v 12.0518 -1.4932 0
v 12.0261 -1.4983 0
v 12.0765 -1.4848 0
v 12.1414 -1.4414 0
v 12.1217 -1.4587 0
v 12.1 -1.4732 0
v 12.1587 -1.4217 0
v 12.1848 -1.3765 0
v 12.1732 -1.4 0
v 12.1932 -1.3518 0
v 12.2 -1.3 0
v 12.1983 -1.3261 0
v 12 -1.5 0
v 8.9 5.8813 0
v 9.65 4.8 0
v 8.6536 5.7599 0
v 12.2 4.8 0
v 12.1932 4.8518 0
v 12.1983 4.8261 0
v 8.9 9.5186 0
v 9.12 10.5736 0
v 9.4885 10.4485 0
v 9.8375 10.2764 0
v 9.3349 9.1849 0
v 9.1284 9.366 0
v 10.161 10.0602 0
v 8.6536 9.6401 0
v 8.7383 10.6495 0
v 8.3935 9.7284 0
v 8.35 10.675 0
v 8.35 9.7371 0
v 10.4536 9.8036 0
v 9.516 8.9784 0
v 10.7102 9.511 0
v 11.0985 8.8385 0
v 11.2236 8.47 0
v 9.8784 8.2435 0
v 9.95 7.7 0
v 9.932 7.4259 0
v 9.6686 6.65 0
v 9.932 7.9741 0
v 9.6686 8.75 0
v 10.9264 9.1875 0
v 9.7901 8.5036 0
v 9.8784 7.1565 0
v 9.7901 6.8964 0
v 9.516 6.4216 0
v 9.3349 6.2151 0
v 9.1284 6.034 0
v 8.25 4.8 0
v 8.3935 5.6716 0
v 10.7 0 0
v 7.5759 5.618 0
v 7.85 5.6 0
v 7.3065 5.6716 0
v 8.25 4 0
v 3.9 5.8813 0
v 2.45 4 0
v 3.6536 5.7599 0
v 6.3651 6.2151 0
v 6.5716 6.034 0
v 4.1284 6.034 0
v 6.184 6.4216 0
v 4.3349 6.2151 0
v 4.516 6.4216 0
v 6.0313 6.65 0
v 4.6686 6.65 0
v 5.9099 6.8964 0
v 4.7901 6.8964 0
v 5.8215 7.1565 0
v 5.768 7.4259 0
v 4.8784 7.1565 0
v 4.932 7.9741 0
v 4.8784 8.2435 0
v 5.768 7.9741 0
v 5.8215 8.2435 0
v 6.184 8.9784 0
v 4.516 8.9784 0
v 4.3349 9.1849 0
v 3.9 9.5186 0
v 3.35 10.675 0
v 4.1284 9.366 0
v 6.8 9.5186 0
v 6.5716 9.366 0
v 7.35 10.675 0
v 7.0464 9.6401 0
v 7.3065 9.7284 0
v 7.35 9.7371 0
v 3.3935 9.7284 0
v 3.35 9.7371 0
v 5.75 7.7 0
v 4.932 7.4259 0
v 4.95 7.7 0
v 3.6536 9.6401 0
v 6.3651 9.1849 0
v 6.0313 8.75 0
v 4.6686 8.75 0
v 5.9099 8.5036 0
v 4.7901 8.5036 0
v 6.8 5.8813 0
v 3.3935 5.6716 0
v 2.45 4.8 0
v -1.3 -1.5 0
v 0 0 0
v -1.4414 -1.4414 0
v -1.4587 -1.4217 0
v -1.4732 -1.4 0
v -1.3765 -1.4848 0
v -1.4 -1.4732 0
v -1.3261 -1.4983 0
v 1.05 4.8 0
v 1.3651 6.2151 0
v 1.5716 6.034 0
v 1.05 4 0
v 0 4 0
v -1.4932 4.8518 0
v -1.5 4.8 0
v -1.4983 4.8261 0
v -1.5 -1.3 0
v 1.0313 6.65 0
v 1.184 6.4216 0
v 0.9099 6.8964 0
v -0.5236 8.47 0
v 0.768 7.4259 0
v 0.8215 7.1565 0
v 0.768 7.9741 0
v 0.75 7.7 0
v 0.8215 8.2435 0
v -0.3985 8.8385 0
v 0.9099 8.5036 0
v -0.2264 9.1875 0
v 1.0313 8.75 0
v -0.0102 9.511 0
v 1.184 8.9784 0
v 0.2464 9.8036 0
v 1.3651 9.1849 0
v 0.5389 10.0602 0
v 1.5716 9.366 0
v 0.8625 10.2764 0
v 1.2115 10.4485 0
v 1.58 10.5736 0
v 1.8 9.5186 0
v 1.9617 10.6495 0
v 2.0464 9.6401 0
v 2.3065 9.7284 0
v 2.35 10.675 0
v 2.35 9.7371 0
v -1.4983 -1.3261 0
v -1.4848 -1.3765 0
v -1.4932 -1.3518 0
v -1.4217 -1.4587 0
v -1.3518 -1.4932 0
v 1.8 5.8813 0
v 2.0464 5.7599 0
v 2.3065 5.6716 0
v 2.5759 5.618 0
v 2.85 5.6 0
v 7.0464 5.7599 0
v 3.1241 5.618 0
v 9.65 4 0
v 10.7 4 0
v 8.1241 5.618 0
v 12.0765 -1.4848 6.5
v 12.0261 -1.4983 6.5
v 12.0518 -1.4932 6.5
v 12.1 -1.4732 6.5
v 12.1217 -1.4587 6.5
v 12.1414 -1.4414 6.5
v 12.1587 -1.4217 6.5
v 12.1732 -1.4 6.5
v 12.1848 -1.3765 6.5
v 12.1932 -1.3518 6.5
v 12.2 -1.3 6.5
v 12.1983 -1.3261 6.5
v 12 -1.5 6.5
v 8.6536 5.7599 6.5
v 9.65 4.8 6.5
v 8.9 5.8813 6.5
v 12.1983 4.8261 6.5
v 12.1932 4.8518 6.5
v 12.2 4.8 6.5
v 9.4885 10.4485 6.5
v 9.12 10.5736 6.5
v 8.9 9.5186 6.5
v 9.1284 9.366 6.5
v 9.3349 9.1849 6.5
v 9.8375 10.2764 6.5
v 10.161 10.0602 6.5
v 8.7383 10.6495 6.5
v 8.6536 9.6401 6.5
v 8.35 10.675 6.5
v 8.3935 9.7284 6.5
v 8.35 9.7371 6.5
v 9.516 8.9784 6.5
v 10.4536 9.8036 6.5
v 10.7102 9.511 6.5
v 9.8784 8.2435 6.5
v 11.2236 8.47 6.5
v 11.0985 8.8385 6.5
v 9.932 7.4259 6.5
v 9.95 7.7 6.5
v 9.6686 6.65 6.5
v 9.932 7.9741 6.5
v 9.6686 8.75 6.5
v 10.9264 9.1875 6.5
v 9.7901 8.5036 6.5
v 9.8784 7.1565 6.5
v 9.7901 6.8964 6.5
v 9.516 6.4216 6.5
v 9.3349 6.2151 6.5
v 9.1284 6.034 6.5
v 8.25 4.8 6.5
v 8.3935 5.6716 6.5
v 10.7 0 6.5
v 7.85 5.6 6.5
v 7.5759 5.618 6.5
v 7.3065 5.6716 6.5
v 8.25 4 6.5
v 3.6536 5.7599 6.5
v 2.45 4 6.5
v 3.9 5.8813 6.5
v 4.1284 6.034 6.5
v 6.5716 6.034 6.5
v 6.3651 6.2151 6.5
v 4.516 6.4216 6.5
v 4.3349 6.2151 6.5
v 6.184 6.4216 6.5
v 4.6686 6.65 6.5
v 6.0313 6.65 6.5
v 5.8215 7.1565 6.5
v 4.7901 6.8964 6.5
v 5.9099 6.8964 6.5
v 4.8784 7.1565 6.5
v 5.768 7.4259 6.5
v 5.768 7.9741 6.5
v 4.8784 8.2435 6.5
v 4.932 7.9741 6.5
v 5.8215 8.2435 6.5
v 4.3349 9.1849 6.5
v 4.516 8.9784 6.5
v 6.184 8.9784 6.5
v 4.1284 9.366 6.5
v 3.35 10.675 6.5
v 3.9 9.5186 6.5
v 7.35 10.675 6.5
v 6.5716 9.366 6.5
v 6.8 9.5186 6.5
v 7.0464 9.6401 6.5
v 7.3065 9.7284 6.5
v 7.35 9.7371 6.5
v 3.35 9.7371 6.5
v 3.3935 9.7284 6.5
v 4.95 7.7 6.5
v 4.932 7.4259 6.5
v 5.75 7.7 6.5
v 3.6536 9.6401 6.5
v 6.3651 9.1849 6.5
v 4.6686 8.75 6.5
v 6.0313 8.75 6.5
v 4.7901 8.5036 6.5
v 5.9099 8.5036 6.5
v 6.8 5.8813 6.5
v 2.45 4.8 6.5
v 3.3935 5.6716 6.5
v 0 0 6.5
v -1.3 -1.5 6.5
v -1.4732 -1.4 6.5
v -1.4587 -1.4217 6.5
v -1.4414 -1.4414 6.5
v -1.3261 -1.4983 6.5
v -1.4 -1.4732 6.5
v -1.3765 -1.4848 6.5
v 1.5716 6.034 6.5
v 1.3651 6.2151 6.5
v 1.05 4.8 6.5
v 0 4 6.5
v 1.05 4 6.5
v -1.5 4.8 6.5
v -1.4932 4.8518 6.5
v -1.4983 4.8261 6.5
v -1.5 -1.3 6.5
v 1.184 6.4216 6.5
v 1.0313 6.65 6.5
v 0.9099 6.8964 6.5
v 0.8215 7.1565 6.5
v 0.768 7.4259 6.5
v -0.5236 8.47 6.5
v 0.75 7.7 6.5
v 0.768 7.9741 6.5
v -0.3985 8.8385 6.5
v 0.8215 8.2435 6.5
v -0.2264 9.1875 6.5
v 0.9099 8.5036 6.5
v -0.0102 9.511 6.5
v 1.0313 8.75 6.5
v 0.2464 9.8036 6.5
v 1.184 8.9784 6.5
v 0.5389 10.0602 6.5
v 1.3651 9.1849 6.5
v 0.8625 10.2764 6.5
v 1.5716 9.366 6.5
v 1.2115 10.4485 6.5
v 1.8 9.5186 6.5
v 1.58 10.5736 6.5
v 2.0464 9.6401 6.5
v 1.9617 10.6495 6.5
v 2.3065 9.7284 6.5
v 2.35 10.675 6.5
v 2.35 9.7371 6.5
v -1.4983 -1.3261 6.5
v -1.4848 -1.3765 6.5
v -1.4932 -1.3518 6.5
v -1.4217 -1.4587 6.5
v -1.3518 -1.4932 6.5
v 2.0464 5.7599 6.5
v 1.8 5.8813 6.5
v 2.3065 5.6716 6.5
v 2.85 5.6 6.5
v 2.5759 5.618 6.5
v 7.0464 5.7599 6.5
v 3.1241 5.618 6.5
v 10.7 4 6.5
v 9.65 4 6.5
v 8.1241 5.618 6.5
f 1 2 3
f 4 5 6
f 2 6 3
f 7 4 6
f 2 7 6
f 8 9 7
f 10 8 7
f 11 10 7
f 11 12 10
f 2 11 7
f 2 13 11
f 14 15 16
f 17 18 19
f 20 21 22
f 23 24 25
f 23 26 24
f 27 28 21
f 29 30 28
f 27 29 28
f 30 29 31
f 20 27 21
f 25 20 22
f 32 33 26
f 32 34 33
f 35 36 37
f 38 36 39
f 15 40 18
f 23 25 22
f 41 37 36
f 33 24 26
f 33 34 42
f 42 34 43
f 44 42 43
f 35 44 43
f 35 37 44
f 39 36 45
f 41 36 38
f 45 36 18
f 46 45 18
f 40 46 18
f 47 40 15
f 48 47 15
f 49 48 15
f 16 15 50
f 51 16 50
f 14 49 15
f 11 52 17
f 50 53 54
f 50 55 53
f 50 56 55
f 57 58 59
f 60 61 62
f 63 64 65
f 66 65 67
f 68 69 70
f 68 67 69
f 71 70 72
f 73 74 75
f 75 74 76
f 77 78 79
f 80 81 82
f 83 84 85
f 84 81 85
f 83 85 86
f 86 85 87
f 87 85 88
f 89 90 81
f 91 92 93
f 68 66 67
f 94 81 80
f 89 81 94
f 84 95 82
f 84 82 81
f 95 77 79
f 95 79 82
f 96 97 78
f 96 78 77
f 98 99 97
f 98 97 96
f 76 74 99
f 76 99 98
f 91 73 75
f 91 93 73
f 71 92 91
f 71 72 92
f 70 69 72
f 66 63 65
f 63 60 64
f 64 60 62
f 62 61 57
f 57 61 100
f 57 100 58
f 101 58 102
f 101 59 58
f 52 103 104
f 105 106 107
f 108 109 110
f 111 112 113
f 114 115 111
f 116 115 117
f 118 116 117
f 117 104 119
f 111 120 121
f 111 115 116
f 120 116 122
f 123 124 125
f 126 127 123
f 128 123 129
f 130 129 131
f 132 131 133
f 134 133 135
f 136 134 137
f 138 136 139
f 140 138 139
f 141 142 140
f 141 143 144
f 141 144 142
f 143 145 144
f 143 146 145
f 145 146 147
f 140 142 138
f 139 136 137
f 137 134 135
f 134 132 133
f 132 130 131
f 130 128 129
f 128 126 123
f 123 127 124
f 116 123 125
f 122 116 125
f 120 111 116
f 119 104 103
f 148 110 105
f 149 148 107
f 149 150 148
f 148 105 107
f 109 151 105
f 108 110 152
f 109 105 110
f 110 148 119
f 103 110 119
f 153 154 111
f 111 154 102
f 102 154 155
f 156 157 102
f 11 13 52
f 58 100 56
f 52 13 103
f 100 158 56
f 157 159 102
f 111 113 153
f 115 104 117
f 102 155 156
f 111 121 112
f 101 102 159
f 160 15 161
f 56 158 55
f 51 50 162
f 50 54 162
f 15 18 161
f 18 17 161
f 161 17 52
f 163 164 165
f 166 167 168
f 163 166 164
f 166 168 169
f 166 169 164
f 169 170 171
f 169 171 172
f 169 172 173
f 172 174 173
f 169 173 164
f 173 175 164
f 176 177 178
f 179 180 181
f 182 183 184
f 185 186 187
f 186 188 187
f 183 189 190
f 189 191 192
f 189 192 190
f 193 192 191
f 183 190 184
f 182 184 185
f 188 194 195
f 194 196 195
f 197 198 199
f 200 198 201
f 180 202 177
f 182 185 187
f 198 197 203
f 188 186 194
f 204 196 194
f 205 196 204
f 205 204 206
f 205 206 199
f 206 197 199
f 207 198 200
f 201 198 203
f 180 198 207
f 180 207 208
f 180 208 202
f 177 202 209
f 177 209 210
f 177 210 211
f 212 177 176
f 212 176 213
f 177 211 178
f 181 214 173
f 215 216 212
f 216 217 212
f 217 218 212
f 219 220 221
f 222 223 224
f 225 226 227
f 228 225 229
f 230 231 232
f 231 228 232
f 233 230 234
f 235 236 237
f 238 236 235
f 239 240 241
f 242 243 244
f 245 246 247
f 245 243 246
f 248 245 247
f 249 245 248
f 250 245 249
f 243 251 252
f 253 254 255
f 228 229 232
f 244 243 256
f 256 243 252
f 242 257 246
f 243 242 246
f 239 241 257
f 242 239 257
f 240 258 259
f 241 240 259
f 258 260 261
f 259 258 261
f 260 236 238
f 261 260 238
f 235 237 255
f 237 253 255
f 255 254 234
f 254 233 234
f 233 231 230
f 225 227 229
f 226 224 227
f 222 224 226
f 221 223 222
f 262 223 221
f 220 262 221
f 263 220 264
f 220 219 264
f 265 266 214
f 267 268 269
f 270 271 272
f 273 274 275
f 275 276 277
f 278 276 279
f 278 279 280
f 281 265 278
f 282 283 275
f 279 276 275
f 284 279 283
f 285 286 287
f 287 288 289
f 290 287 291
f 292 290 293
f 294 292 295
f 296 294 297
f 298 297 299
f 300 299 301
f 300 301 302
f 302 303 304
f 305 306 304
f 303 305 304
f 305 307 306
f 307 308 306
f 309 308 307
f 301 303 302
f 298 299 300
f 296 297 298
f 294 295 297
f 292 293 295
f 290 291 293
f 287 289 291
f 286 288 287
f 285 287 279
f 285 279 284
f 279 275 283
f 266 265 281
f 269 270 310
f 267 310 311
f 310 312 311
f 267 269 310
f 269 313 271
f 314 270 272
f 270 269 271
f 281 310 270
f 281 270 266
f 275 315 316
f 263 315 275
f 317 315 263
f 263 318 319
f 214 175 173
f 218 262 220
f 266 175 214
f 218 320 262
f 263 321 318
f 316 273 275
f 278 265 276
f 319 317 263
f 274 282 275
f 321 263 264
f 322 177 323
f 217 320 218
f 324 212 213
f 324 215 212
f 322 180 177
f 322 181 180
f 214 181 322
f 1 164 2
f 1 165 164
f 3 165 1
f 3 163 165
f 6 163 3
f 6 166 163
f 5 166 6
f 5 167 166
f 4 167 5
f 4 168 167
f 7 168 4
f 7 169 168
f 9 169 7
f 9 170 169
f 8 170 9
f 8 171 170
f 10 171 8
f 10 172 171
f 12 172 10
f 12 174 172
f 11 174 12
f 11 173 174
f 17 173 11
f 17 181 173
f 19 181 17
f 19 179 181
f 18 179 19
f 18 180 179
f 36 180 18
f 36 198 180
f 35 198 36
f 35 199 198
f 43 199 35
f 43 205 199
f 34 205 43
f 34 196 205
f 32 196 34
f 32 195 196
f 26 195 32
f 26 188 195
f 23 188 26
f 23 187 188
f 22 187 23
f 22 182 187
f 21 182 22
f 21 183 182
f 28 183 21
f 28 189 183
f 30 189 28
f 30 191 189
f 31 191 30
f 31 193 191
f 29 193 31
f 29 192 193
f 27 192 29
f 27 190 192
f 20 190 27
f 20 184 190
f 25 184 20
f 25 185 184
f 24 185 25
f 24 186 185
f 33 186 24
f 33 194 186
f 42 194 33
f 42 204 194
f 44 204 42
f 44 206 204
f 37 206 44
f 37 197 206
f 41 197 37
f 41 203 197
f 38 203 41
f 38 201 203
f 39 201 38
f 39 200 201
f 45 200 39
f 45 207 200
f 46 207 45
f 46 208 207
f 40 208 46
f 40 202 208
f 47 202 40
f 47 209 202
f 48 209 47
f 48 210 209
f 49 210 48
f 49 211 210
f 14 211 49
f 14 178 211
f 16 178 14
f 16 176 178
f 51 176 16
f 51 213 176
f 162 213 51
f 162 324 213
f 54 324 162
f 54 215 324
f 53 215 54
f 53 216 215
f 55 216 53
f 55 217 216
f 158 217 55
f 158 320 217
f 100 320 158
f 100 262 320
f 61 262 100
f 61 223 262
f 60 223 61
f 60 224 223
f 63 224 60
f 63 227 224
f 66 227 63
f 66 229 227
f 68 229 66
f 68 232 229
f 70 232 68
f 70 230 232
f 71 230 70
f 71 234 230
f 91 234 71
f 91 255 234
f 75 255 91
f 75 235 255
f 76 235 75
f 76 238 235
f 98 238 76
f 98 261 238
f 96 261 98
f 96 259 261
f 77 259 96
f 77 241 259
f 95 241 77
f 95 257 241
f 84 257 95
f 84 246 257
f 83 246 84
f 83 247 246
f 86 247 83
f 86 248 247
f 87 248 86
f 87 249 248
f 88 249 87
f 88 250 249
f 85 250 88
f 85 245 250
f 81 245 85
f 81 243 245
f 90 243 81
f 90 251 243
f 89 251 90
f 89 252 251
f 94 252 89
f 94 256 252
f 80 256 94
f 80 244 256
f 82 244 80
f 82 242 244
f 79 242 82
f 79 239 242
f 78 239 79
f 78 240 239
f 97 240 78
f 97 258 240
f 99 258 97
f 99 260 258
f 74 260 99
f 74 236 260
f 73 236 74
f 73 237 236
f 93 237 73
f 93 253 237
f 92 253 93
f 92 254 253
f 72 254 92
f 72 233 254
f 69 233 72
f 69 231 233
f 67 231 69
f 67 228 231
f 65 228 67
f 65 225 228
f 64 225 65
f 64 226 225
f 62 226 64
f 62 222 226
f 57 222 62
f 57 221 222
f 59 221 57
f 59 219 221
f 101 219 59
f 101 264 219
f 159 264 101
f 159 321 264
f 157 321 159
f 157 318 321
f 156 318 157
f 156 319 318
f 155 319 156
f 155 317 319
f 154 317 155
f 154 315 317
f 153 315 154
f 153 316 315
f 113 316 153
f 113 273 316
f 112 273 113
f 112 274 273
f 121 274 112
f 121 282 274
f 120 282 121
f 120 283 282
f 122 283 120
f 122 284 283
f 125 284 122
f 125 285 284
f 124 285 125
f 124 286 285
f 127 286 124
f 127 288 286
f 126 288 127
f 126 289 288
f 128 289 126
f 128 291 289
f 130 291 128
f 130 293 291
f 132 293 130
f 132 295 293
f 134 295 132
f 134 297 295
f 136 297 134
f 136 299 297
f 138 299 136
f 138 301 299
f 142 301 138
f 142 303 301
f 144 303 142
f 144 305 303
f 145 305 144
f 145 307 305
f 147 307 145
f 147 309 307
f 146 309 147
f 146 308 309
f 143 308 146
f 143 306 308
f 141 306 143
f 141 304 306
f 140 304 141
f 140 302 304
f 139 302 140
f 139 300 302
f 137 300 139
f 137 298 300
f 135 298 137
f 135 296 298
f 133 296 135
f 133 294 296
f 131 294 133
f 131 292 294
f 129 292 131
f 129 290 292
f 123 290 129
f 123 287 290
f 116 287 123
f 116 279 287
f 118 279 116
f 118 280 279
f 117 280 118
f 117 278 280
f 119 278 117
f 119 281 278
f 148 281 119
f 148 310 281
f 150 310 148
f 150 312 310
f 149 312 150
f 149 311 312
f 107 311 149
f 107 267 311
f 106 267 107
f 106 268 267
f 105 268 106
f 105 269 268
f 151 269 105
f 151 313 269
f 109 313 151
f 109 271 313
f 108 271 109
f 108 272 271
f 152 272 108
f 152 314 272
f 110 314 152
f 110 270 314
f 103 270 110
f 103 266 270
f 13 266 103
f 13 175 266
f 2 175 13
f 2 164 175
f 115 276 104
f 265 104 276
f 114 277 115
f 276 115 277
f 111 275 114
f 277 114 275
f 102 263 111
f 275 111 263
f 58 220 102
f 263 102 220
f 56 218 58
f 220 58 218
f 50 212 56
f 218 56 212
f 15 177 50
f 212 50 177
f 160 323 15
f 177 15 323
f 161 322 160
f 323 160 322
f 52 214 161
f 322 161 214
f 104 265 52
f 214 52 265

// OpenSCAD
//Zippy Impact 3S 1500 mAh 25C
//cells = 3;
//cable_dia = 4;

//GNB 4S 1300 mAh 110C
//cells = 4;
//cable_dia = 4.5;

//Turnigy BOLT 2S HV 500 mAh 65C: 1.75
//cells = 3;
//cable_dia = 4;

/* [Global] */
/* [Battery Specs] */
cells = 3; // [2:8]
cable_dia = 4; // [1:0.1:7]

/* [Optional tunings] */
height = 6.5; // [4:0.5:10]
thickness = 1.3; // [0.7:0.1:2]

/* [Hidden] */
width = 8.2 + 2.5 * (cells - 2);
length = 4.8;
$fn = 48;
steg = 1;

module BalancerMount(){
    difference(){
        hull(){
            for(x = [-thickness, width+thickness])
            for (y = [-thickness, length]) translate([x, y, 0]) circle(0.2);
            translate([width/2-cable_dia/2-steg, length+cable_dia/2+thickness-0.4, 0]){
                for (x = [0, cable_dia+steg*2]) translate([x, 0, 0]) circle(d=cable_dia+thickness*1.5);
            } 
        };
        translate([width/2-cable_dia/2-steg/2, length+cable_dia/2+thickness-0.4, 0]){
            for (x = [0, cable_dia+1]) translate([x, 0, 0]){
                circle(d=cable_dia+0.2);
                translate([-cable_dia/8, 0, 0]) square([cable_dia/4, cable_dia+thickness]);
            };
        }; 
        plug();
    };
};

module plug(){
    square([width,length-0.8]);
    for(x = [1.05, width-2.45]) translate([x, length-0.8, 0]) square([1.4, 0.8]);
};

linear_extrude(height) BalancerMount();
